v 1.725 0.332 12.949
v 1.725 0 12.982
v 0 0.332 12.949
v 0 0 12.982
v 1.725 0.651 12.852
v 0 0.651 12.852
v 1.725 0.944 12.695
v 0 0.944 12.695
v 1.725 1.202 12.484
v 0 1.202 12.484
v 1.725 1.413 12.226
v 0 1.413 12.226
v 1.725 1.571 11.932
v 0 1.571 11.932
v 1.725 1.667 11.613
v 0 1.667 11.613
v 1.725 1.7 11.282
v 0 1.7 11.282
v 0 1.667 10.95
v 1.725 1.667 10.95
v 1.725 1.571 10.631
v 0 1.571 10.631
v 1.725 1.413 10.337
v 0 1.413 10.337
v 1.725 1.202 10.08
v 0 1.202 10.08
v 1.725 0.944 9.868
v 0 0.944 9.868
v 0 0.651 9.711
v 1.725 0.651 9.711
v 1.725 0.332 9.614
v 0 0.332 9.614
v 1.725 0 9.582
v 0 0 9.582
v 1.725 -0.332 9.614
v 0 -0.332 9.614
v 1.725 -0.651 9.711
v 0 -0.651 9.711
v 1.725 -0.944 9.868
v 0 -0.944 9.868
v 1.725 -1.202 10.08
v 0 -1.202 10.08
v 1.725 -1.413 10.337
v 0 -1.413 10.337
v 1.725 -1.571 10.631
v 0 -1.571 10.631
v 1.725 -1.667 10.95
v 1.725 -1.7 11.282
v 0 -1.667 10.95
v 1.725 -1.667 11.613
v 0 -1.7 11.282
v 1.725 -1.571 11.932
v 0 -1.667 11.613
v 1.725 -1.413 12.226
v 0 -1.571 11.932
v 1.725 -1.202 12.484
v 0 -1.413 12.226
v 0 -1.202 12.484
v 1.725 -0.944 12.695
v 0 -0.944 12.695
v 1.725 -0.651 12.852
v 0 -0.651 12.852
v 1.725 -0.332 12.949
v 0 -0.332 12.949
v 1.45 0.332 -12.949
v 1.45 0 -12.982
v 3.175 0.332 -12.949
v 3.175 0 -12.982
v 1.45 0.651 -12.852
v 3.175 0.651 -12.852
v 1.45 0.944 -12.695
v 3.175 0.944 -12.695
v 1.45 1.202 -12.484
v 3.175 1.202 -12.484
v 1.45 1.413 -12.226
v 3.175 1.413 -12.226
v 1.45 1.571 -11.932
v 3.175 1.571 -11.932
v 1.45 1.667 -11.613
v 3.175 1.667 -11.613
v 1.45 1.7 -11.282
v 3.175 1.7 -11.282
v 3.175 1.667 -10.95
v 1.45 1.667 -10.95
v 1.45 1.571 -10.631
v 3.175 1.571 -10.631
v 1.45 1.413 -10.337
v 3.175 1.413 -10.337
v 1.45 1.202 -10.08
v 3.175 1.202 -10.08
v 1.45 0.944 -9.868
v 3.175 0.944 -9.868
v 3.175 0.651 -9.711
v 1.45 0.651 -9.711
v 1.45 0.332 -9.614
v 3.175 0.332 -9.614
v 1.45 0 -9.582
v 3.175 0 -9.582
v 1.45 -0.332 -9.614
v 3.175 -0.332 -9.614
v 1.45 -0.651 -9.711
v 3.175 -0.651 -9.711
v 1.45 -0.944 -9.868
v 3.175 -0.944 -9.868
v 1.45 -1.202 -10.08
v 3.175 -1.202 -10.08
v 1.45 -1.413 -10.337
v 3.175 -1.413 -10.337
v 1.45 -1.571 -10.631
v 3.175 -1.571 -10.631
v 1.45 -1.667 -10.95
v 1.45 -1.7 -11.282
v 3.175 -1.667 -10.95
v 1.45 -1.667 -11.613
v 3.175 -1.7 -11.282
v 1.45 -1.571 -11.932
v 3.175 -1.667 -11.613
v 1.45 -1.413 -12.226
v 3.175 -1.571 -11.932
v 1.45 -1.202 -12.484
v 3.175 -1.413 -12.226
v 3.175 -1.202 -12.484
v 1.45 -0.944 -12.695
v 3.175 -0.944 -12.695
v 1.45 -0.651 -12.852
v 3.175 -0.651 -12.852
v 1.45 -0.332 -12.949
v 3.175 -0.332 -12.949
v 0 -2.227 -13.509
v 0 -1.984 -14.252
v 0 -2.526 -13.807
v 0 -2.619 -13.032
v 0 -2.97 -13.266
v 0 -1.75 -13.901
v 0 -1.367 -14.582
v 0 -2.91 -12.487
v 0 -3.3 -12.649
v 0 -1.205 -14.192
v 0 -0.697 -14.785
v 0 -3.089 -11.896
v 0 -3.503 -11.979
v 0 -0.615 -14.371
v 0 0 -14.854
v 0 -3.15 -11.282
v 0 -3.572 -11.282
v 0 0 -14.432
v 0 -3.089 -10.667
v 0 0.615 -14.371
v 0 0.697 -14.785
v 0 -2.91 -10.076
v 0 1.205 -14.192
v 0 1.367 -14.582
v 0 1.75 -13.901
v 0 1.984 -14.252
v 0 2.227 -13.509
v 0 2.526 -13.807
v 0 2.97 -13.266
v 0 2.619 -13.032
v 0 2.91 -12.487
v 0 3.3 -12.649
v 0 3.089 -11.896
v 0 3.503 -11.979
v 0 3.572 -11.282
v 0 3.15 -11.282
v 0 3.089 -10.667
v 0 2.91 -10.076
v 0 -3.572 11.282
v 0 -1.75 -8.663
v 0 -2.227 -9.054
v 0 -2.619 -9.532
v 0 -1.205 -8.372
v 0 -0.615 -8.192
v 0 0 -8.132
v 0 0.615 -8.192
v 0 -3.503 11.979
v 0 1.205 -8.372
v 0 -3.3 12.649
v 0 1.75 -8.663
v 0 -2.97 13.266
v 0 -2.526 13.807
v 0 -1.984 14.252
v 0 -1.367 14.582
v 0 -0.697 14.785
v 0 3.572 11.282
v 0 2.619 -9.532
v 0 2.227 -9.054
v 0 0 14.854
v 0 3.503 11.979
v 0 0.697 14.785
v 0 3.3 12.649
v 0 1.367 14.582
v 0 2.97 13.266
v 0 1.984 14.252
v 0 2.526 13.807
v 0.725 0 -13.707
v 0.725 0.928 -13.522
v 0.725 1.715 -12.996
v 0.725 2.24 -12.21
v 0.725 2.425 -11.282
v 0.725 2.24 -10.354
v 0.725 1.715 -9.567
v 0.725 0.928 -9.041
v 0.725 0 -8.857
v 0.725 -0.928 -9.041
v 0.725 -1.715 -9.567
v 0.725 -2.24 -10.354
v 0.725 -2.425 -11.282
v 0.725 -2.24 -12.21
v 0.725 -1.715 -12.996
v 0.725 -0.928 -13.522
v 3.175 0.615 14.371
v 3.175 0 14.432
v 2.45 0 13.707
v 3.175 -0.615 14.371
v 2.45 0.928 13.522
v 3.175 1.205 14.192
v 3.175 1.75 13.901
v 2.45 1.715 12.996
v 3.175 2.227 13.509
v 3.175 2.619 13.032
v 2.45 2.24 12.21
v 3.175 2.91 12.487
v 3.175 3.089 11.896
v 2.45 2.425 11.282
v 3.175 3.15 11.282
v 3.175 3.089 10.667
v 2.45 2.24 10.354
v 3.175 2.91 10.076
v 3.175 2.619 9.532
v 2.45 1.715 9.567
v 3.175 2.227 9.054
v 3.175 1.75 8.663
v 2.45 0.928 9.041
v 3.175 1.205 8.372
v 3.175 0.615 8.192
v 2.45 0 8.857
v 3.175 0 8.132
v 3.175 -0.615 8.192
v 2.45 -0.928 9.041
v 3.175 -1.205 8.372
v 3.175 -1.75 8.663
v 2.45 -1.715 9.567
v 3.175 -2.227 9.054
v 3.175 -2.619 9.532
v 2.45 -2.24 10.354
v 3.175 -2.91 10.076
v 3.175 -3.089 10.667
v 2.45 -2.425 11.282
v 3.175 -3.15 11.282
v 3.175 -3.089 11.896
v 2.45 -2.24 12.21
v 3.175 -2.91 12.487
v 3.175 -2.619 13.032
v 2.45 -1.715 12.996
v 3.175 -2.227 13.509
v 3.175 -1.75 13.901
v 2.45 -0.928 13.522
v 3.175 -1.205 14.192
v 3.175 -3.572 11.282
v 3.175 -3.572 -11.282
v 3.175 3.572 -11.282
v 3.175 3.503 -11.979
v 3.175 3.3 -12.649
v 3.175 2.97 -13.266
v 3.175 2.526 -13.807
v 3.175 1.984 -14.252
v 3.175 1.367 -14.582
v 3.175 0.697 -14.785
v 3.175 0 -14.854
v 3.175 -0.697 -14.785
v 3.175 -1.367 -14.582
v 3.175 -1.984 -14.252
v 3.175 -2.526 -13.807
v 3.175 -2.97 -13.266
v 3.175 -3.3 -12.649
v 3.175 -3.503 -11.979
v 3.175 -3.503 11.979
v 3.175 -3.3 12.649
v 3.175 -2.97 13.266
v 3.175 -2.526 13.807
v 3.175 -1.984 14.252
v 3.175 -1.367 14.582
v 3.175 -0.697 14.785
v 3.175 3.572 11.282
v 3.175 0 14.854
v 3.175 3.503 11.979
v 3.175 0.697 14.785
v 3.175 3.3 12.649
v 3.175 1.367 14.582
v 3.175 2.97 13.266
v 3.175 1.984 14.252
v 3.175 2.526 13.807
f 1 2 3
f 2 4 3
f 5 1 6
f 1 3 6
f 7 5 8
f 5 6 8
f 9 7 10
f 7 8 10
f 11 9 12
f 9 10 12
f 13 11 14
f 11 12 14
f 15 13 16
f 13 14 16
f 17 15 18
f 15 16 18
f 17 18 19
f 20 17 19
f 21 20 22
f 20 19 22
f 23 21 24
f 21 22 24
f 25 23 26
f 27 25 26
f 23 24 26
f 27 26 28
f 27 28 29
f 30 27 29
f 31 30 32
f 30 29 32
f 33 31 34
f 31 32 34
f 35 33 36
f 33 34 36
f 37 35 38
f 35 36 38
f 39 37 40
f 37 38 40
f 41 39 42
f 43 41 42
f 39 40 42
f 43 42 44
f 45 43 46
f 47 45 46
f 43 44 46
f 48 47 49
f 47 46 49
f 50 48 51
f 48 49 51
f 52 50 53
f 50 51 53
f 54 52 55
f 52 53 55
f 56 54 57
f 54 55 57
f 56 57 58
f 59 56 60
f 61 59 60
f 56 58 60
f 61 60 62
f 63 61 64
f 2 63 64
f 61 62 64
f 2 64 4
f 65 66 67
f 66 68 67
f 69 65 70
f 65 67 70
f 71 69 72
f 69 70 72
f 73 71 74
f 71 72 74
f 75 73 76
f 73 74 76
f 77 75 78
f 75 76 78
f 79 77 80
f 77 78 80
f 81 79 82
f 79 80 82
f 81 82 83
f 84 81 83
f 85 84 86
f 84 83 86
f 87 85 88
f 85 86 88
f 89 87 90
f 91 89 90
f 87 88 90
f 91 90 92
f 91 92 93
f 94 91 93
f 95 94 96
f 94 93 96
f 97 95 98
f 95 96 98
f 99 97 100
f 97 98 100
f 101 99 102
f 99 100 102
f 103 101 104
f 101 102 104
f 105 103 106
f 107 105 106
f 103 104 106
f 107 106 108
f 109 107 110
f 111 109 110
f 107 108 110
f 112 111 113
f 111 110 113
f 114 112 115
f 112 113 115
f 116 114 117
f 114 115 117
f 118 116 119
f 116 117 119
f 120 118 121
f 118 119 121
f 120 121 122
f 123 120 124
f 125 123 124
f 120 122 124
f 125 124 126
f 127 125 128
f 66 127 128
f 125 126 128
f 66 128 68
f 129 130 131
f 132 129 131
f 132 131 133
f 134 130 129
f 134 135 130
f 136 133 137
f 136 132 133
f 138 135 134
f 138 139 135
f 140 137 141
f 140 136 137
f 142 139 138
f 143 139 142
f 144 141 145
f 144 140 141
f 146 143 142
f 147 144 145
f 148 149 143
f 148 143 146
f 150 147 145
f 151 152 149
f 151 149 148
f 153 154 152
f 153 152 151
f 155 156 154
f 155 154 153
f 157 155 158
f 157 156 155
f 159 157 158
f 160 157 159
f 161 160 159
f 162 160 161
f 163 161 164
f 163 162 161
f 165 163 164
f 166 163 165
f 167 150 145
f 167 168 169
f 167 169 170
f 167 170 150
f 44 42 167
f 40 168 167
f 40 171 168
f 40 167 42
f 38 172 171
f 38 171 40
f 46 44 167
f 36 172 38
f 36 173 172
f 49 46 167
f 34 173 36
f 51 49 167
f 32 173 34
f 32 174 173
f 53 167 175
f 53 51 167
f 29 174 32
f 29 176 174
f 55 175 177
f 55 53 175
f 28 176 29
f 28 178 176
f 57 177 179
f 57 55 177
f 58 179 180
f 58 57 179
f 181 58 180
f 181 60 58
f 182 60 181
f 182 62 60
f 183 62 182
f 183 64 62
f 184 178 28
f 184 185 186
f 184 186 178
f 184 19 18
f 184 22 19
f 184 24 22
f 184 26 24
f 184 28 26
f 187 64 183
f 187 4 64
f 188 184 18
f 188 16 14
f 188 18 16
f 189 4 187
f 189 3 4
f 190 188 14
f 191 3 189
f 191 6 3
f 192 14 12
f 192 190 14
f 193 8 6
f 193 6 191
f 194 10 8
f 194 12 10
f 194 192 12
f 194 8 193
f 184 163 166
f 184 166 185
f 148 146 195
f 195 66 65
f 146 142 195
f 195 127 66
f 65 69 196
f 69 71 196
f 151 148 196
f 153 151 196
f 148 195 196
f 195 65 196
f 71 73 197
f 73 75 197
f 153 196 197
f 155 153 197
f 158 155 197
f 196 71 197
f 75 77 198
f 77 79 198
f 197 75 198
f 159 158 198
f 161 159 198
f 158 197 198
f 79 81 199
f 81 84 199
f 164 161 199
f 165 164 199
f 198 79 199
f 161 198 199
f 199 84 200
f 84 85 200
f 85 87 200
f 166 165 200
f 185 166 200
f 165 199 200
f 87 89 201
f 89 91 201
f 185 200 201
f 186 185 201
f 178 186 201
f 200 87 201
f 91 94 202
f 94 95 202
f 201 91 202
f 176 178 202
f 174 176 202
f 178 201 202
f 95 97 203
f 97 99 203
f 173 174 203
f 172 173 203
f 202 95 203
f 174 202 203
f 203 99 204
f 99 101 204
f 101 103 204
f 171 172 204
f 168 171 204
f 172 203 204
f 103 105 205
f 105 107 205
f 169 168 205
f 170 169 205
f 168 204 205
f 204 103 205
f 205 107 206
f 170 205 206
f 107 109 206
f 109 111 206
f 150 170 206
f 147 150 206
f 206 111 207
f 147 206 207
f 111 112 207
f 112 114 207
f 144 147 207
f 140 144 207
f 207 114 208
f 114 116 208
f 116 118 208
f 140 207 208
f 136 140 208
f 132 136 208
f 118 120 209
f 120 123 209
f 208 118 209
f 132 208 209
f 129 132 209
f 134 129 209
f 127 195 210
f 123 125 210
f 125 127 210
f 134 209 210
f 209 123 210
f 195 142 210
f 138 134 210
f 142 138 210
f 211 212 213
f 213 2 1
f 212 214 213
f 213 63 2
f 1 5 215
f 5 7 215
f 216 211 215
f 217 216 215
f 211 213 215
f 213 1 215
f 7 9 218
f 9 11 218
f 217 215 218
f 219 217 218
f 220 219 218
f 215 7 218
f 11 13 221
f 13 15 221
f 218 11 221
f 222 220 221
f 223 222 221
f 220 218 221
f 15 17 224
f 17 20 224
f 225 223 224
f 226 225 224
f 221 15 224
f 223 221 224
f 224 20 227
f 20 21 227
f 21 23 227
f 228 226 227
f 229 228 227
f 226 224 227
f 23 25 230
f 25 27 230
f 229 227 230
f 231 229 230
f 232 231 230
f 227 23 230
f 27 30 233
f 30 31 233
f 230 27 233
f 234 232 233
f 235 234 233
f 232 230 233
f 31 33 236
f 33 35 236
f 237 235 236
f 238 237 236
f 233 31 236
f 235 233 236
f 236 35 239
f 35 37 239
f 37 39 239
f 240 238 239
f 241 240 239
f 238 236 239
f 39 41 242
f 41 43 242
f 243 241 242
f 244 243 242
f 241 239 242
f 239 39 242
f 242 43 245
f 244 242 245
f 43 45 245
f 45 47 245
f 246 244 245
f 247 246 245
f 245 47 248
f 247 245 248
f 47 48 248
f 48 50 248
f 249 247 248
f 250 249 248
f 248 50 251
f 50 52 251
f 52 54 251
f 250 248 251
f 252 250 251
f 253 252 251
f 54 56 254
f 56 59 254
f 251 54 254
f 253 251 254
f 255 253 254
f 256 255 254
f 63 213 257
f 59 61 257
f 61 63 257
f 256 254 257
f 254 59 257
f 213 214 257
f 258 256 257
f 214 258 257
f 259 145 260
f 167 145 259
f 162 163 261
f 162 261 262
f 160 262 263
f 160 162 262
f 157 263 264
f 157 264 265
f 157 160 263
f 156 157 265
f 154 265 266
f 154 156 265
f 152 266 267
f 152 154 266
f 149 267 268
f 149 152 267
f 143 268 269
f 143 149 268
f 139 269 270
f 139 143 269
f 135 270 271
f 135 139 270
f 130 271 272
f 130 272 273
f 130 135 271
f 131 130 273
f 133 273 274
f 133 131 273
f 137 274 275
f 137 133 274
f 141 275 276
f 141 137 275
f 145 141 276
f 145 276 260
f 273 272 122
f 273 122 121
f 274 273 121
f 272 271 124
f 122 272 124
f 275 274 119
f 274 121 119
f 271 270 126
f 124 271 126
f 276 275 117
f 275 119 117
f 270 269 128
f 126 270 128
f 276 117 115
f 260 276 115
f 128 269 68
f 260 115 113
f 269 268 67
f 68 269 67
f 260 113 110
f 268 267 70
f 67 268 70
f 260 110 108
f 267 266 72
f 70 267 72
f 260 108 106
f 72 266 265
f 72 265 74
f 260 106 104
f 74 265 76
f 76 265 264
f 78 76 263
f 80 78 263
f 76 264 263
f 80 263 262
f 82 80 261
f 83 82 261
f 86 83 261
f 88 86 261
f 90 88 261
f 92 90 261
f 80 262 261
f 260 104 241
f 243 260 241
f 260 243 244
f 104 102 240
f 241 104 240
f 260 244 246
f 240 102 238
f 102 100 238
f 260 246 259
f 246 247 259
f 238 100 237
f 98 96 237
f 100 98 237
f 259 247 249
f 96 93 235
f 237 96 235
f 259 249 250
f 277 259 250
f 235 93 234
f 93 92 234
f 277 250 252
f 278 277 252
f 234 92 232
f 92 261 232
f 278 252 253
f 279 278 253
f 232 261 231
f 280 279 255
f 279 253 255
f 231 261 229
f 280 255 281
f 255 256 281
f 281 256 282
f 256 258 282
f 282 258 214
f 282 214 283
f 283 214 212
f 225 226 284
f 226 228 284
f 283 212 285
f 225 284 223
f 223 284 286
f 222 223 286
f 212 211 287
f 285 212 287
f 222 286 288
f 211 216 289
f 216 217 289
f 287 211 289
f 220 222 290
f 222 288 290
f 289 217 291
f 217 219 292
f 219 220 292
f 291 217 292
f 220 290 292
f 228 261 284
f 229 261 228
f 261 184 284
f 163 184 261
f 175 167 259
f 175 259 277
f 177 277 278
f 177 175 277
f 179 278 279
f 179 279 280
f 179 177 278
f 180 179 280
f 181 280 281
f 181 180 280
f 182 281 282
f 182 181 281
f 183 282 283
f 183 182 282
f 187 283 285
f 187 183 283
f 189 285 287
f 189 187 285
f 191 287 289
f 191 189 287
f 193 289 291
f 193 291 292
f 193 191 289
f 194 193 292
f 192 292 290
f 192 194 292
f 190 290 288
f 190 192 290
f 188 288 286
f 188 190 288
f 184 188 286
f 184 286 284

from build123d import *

# Parameters (mm, degrees)
BOSS_EXTRUDE1_DEPTH                             = 3.175
CSK_FOR_M3_FLAT_HEAD_MACHINE_SCREW1_D           = 3.4
CSK_FOR_M3_FLAT_HEAD_MACHINE_SCREW1_DEPTH       = 7.62
CSK_FOR_M3_FLAT_HEAD_MACHINE_SCREW1_CSINK_D     = 6.3
CSK_FOR_M3_FLAT_HEAD_MACHINE_SCREW1_CSINK_ANGLE = 90
CSK_FOR_M3_FLAT_HEAD_MACHINE_SCREW1_TIP         = 1.021463052
CSK_FOR_M3_FLAT_HEAD_MACHINE_SCREW2_D           = 3.4
CSK_FOR_M3_FLAT_HEAD_MACHINE_SCREW2_DEPTH       = 7.62
CSK_FOR_M3_FLAT_HEAD_MACHINE_SCREW2_CSINK_D     = 6.3
CSK_FOR_M3_FLAT_HEAD_MACHINE_SCREW2_CSINK_ANGLE = 90
CSK_FOR_M3_FLAT_HEAD_MACHINE_SCREW2_TIP         = 1.021463052


with BuildPart() as part:
    # Sketch1 → Boss-Extrude1 (new body)
    with BuildSketch(Plane(origin=(0, 0, 0), x_dir=(0, 0, -1), z_dir=(1, 0, 0))):
        with BuildLine():
            Line((-11.281730167, 3.571875), (11.281730167, 3.571875))
            ThreePointArc((11.281730167, 3.571875), (14.853605167, 0), (11.281730167, -3.571875))
            Line((11.281730167, -3.571875), (-11.281730167, -3.571875))
            ThreePointArc((-11.281730167, -3.571875), (-14.853605167, 0), (-11.281730167, 3.571875))
        make_face()
    extrude(amount=BOSS_EXTRUDE1_DEPTH)

    # CSK for M3 Flat Head Machine Screw1
    with Locations(Plane.ZY):
        with Locations((-11.281730167, 0)):
            CounterSinkHole(CSK_FOR_M3_FLAT_HEAD_MACHINE_SCREW1_D / 2, CSK_FOR_M3_FLAT_HEAD_MACHINE_SCREW1_CSINK_D / 2, depth=CSK_FOR_M3_FLAT_HEAD_MACHINE_SCREW1_DEPTH, counter_sink_angle=CSK_FOR_M3_FLAT_HEAD_MACHINE_SCREW1_CSINK_ANGLE)
            with Locations((0, 0, -(CSK_FOR_M3_FLAT_HEAD_MACHINE_SCREW1_DEPTH + CSK_FOR_M3_FLAT_HEAD_MACHINE_SCREW1_TIP / 2))):  # 118° drill point
                Cone(0, CSK_FOR_M3_FLAT_HEAD_MACHINE_SCREW1_D / 2, CSK_FOR_M3_FLAT_HEAD_MACHINE_SCREW1_TIP, mode=Mode.SUBTRACT)

    # CSK for M3 Flat Head Machine Screw2
    with Locations(Plane(origin=(3.175, 0, 0), x_dir=(0, 0, -1), z_dir=(1, 0, 0))):
        with Locations((-11.281730167, 0)):
            CounterSinkHole(CSK_FOR_M3_FLAT_HEAD_MACHINE_SCREW2_D / 2, CSK_FOR_M3_FLAT_HEAD_MACHINE_SCREW2_CSINK_D / 2, depth=CSK_FOR_M3_FLAT_HEAD_MACHINE_SCREW2_DEPTH, counter_sink_angle=CSK_FOR_M3_FLAT_HEAD_MACHINE_SCREW2_CSINK_ANGLE)
            with Locations((0, 0, -(CSK_FOR_M3_FLAT_HEAD_MACHINE_SCREW2_DEPTH + CSK_FOR_M3_FLAT_HEAD_MACHINE_SCREW2_TIP / 2))):  # 118° drill point
                Cone(0, CSK_FOR_M3_FLAT_HEAD_MACHINE_SCREW2_D / 2, CSK_FOR_M3_FLAT_HEAD_MACHINE_SCREW2_TIP, mode=Mode.SUBTRACT)


solid = part.part
